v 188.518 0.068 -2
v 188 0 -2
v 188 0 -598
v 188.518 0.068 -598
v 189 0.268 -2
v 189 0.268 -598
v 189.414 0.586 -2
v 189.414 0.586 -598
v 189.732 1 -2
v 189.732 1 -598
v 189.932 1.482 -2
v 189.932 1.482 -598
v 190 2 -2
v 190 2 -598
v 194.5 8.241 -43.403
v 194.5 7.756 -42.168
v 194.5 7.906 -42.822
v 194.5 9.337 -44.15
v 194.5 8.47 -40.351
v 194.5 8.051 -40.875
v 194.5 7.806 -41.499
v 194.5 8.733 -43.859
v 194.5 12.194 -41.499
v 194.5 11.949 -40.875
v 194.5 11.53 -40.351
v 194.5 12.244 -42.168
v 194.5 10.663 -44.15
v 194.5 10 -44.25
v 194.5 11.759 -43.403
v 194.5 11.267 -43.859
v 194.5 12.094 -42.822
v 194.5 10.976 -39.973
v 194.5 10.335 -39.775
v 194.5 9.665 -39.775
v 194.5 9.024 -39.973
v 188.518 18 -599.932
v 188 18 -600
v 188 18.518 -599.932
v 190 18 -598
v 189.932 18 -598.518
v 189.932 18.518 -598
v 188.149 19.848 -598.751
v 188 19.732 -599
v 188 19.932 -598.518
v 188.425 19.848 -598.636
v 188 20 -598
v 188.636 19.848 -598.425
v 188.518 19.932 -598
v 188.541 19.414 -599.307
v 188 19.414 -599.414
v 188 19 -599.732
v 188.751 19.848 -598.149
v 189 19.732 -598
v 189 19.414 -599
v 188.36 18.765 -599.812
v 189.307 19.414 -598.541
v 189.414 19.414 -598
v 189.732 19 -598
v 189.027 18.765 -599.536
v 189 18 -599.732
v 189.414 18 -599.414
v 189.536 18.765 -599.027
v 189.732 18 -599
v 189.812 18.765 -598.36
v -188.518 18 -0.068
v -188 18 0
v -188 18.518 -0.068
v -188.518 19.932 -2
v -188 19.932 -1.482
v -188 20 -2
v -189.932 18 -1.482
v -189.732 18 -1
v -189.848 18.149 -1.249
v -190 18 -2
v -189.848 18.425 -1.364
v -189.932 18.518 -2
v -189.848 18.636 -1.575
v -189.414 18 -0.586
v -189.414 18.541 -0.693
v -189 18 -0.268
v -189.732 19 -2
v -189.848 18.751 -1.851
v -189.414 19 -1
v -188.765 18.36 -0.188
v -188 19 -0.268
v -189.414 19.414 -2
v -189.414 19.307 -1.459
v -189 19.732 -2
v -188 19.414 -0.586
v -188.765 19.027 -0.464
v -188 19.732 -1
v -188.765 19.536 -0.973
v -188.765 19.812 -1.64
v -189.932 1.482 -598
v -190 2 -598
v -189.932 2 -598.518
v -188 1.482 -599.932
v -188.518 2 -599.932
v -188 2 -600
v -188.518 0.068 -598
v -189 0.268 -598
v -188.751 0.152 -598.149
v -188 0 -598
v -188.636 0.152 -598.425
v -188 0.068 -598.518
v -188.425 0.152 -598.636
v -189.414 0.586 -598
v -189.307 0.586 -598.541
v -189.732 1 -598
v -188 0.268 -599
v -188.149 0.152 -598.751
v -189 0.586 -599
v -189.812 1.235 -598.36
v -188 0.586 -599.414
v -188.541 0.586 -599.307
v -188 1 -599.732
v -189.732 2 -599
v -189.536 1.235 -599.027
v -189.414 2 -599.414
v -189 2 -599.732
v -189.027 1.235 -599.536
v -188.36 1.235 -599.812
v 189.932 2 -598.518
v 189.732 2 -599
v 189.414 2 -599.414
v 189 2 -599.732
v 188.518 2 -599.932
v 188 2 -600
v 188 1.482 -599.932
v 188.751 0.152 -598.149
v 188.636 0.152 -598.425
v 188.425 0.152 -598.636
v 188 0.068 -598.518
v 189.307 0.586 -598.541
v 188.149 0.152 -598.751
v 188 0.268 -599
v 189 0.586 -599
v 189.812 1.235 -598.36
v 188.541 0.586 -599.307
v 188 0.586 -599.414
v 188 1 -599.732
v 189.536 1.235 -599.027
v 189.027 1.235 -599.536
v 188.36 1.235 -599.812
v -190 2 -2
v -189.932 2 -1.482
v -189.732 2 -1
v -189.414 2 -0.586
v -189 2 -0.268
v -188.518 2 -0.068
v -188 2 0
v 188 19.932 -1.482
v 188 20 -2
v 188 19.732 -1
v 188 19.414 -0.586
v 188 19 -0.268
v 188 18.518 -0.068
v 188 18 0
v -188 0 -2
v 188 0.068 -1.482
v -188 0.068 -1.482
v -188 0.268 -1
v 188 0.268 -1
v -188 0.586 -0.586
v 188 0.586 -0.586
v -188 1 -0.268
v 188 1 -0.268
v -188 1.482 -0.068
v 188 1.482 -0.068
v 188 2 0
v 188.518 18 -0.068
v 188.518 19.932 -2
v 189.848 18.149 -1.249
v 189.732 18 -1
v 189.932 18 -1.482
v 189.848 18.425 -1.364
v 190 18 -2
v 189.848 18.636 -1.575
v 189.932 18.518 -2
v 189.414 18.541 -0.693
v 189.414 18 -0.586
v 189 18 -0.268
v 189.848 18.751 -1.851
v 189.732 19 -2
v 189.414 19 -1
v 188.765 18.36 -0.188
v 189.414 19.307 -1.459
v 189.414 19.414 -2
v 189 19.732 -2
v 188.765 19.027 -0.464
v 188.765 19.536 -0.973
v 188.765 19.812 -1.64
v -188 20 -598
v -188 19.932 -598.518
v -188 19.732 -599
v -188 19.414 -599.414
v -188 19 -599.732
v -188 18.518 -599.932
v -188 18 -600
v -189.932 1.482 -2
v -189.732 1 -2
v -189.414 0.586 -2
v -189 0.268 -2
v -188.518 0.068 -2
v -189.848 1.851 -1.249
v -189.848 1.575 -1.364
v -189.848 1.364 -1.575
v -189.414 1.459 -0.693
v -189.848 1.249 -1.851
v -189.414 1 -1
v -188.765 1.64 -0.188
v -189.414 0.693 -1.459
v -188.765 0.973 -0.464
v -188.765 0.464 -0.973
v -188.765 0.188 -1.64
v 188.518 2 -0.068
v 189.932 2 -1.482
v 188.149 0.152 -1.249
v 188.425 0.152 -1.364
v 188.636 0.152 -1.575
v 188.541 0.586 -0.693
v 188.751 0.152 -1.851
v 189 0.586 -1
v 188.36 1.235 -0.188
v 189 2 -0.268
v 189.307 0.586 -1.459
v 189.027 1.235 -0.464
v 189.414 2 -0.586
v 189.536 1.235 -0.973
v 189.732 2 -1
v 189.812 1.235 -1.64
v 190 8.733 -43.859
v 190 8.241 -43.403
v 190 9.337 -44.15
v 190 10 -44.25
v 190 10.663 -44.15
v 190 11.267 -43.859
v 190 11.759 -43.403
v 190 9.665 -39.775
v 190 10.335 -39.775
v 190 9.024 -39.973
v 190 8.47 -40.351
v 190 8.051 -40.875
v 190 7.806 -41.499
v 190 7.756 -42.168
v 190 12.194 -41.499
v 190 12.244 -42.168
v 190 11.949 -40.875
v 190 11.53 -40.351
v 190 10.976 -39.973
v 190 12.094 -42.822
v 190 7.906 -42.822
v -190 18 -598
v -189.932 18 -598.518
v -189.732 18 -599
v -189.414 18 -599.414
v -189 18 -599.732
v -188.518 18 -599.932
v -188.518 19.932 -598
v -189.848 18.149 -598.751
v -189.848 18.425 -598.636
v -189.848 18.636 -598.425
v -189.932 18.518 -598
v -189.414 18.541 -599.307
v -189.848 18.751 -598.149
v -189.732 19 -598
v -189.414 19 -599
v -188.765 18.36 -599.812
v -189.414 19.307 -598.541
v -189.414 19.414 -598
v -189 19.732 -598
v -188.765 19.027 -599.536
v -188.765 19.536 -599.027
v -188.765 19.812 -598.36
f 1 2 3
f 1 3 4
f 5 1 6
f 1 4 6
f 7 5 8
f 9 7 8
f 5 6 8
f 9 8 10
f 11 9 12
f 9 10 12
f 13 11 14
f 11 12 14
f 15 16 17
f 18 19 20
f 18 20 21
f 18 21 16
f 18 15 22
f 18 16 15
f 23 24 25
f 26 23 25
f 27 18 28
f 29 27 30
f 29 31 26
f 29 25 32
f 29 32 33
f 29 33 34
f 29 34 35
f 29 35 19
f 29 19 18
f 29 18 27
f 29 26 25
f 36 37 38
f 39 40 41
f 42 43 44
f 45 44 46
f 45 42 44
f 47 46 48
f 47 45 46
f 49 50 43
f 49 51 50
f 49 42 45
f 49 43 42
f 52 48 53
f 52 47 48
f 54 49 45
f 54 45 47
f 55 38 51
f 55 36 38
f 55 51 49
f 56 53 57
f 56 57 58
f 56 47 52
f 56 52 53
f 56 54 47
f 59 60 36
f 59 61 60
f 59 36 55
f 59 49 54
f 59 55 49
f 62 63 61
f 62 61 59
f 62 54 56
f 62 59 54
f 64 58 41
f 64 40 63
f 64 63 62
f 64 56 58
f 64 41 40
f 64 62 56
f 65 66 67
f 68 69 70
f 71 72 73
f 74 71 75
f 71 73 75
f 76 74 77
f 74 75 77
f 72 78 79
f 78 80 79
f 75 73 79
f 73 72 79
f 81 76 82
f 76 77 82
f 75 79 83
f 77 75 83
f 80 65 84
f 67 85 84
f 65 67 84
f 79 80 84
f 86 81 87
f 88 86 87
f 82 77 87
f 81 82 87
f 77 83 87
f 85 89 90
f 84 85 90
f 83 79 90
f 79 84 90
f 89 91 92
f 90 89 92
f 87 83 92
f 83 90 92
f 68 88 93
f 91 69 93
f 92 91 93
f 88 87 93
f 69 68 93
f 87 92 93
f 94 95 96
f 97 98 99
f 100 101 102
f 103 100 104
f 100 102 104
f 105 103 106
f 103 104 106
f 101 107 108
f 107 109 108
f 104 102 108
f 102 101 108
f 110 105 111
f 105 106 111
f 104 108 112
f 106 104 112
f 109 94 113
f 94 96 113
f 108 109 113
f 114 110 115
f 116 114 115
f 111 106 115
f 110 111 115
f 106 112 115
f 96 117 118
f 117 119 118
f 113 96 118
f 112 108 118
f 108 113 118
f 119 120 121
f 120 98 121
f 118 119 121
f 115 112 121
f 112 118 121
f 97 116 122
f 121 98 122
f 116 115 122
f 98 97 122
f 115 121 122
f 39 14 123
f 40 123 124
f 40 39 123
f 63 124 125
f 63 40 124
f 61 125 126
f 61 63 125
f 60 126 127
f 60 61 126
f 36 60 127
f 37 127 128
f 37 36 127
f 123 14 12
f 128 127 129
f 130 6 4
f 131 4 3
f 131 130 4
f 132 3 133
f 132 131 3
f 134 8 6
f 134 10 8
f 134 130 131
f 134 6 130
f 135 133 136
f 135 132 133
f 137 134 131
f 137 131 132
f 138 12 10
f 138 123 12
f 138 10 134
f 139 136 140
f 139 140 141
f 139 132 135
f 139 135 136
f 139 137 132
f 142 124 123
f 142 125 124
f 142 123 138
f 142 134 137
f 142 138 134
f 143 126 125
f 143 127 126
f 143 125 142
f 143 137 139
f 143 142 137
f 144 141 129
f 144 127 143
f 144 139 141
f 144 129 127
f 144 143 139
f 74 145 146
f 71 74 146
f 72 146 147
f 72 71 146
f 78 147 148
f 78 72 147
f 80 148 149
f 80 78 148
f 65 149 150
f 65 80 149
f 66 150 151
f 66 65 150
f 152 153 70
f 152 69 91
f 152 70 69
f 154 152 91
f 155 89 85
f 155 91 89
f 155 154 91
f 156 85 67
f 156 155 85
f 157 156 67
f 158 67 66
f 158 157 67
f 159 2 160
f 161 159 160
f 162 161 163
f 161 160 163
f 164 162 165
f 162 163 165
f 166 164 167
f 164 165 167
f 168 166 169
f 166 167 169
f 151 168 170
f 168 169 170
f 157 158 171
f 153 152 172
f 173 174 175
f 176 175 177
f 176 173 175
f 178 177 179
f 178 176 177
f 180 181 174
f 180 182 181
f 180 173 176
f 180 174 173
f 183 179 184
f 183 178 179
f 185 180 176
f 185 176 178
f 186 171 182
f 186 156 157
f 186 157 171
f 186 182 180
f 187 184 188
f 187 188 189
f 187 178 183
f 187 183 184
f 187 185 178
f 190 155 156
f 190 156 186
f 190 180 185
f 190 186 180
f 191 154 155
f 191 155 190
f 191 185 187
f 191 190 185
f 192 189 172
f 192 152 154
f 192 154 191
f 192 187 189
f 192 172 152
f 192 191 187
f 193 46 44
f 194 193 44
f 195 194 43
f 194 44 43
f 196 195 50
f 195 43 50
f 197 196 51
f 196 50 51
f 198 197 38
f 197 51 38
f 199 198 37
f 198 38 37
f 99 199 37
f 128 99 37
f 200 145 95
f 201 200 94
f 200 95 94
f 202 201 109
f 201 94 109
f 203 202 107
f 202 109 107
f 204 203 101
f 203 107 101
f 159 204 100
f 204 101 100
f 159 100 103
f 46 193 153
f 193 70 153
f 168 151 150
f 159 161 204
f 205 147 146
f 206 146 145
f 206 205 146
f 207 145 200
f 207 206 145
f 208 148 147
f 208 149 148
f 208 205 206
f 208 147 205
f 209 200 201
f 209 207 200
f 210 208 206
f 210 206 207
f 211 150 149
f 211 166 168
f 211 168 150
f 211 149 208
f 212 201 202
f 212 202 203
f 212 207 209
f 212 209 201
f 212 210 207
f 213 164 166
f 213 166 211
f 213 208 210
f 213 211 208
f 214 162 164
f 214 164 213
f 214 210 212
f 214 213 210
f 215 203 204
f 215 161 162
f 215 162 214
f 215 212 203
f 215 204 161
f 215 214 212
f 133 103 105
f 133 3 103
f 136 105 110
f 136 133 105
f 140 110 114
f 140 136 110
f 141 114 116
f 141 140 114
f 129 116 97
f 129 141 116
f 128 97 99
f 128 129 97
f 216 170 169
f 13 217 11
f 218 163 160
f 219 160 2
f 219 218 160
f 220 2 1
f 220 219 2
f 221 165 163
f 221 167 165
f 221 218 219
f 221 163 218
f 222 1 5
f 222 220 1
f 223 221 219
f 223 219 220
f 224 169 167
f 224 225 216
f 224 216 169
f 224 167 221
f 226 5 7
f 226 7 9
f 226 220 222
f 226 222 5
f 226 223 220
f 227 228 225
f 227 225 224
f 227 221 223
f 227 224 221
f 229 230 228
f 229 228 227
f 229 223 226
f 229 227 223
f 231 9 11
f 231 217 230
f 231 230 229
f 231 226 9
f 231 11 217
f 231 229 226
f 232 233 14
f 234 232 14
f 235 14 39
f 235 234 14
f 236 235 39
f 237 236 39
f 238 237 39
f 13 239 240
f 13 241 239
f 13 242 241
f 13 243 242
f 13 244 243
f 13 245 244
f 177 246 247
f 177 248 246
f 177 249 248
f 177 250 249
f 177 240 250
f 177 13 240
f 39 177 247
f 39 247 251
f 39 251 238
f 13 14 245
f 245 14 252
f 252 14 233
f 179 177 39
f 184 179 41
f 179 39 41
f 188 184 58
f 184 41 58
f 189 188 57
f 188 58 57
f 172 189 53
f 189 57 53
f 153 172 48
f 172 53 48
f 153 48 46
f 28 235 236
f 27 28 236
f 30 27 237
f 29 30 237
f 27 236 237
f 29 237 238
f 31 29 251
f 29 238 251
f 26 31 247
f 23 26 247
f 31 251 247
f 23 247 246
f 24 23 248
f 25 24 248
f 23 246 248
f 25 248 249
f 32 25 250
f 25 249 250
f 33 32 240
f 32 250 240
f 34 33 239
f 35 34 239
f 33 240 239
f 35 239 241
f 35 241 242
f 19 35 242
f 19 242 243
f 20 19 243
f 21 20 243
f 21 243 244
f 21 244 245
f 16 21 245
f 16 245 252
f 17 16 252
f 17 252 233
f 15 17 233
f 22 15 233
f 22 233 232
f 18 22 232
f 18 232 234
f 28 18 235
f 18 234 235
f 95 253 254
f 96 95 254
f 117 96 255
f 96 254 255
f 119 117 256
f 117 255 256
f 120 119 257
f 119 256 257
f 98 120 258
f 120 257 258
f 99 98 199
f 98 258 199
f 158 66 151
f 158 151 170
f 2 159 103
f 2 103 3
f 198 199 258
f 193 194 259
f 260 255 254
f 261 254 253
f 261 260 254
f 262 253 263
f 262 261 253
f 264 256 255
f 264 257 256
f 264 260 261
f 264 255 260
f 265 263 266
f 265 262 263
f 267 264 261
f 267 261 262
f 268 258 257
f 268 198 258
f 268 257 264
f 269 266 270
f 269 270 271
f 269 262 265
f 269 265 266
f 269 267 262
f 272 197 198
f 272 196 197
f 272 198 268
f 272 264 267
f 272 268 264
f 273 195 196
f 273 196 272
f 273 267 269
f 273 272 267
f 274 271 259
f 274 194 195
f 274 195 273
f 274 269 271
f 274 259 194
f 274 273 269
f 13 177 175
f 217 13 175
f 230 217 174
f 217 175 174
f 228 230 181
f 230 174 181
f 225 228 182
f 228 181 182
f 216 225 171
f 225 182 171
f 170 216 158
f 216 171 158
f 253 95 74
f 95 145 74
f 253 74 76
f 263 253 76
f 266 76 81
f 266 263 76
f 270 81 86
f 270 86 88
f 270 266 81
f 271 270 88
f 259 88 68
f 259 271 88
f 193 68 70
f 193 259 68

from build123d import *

# Parameters (mm, degrees)
SKETCH1_W           = 380
SKETCH1_H           = 20
BOSS_EXTRUDE1_DEPTH = 600
FILLET1_R           = 2
SKETCH3_R           = 2.25
BOSS_EXTRUDE3_DEPTH = 4.5


with BuildPart() as part:
    # Sketch1 → Boss-Extrude1 (new body)
    with BuildSketch(Plane.XY):
        with Locations((0, 10)):
            Rectangle(SKETCH1_W, SKETCH1_H)
    extrude(amount=-BOSS_EXTRUDE1_DEPTH)

    # Fillet1
    fillet1_edges = [part.edges().sort_by_distance(p)[0] for p in [
        (190, 10, -600),
        (0, 20, -600),
        (-190, 10, -600),
        (0, 20, 0),
        (190, 10, 0),
        (0, 0, 0),
        (-190, 10, 0),
        (-190, 20, -300),
        (190, 20, -300),
        (190, 0, -300),
        (-190, 0, -300),
        (0, 0, -600),
    ]]
    fillet(fillet1_edges, radius=FILLET1_R)

    # Sketch3 → Boss-Extrude3 (add)
    with BuildSketch(Plane(origin=(190, 0, 0), x_dir=(0, 0, -1), z_dir=(1, 0, 0))):
        with Locations((42, 10)):
            Circle(SKETCH3_R)
    extrude(amount=BOSS_EXTRUDE3_DEPTH)


solid = part.part
